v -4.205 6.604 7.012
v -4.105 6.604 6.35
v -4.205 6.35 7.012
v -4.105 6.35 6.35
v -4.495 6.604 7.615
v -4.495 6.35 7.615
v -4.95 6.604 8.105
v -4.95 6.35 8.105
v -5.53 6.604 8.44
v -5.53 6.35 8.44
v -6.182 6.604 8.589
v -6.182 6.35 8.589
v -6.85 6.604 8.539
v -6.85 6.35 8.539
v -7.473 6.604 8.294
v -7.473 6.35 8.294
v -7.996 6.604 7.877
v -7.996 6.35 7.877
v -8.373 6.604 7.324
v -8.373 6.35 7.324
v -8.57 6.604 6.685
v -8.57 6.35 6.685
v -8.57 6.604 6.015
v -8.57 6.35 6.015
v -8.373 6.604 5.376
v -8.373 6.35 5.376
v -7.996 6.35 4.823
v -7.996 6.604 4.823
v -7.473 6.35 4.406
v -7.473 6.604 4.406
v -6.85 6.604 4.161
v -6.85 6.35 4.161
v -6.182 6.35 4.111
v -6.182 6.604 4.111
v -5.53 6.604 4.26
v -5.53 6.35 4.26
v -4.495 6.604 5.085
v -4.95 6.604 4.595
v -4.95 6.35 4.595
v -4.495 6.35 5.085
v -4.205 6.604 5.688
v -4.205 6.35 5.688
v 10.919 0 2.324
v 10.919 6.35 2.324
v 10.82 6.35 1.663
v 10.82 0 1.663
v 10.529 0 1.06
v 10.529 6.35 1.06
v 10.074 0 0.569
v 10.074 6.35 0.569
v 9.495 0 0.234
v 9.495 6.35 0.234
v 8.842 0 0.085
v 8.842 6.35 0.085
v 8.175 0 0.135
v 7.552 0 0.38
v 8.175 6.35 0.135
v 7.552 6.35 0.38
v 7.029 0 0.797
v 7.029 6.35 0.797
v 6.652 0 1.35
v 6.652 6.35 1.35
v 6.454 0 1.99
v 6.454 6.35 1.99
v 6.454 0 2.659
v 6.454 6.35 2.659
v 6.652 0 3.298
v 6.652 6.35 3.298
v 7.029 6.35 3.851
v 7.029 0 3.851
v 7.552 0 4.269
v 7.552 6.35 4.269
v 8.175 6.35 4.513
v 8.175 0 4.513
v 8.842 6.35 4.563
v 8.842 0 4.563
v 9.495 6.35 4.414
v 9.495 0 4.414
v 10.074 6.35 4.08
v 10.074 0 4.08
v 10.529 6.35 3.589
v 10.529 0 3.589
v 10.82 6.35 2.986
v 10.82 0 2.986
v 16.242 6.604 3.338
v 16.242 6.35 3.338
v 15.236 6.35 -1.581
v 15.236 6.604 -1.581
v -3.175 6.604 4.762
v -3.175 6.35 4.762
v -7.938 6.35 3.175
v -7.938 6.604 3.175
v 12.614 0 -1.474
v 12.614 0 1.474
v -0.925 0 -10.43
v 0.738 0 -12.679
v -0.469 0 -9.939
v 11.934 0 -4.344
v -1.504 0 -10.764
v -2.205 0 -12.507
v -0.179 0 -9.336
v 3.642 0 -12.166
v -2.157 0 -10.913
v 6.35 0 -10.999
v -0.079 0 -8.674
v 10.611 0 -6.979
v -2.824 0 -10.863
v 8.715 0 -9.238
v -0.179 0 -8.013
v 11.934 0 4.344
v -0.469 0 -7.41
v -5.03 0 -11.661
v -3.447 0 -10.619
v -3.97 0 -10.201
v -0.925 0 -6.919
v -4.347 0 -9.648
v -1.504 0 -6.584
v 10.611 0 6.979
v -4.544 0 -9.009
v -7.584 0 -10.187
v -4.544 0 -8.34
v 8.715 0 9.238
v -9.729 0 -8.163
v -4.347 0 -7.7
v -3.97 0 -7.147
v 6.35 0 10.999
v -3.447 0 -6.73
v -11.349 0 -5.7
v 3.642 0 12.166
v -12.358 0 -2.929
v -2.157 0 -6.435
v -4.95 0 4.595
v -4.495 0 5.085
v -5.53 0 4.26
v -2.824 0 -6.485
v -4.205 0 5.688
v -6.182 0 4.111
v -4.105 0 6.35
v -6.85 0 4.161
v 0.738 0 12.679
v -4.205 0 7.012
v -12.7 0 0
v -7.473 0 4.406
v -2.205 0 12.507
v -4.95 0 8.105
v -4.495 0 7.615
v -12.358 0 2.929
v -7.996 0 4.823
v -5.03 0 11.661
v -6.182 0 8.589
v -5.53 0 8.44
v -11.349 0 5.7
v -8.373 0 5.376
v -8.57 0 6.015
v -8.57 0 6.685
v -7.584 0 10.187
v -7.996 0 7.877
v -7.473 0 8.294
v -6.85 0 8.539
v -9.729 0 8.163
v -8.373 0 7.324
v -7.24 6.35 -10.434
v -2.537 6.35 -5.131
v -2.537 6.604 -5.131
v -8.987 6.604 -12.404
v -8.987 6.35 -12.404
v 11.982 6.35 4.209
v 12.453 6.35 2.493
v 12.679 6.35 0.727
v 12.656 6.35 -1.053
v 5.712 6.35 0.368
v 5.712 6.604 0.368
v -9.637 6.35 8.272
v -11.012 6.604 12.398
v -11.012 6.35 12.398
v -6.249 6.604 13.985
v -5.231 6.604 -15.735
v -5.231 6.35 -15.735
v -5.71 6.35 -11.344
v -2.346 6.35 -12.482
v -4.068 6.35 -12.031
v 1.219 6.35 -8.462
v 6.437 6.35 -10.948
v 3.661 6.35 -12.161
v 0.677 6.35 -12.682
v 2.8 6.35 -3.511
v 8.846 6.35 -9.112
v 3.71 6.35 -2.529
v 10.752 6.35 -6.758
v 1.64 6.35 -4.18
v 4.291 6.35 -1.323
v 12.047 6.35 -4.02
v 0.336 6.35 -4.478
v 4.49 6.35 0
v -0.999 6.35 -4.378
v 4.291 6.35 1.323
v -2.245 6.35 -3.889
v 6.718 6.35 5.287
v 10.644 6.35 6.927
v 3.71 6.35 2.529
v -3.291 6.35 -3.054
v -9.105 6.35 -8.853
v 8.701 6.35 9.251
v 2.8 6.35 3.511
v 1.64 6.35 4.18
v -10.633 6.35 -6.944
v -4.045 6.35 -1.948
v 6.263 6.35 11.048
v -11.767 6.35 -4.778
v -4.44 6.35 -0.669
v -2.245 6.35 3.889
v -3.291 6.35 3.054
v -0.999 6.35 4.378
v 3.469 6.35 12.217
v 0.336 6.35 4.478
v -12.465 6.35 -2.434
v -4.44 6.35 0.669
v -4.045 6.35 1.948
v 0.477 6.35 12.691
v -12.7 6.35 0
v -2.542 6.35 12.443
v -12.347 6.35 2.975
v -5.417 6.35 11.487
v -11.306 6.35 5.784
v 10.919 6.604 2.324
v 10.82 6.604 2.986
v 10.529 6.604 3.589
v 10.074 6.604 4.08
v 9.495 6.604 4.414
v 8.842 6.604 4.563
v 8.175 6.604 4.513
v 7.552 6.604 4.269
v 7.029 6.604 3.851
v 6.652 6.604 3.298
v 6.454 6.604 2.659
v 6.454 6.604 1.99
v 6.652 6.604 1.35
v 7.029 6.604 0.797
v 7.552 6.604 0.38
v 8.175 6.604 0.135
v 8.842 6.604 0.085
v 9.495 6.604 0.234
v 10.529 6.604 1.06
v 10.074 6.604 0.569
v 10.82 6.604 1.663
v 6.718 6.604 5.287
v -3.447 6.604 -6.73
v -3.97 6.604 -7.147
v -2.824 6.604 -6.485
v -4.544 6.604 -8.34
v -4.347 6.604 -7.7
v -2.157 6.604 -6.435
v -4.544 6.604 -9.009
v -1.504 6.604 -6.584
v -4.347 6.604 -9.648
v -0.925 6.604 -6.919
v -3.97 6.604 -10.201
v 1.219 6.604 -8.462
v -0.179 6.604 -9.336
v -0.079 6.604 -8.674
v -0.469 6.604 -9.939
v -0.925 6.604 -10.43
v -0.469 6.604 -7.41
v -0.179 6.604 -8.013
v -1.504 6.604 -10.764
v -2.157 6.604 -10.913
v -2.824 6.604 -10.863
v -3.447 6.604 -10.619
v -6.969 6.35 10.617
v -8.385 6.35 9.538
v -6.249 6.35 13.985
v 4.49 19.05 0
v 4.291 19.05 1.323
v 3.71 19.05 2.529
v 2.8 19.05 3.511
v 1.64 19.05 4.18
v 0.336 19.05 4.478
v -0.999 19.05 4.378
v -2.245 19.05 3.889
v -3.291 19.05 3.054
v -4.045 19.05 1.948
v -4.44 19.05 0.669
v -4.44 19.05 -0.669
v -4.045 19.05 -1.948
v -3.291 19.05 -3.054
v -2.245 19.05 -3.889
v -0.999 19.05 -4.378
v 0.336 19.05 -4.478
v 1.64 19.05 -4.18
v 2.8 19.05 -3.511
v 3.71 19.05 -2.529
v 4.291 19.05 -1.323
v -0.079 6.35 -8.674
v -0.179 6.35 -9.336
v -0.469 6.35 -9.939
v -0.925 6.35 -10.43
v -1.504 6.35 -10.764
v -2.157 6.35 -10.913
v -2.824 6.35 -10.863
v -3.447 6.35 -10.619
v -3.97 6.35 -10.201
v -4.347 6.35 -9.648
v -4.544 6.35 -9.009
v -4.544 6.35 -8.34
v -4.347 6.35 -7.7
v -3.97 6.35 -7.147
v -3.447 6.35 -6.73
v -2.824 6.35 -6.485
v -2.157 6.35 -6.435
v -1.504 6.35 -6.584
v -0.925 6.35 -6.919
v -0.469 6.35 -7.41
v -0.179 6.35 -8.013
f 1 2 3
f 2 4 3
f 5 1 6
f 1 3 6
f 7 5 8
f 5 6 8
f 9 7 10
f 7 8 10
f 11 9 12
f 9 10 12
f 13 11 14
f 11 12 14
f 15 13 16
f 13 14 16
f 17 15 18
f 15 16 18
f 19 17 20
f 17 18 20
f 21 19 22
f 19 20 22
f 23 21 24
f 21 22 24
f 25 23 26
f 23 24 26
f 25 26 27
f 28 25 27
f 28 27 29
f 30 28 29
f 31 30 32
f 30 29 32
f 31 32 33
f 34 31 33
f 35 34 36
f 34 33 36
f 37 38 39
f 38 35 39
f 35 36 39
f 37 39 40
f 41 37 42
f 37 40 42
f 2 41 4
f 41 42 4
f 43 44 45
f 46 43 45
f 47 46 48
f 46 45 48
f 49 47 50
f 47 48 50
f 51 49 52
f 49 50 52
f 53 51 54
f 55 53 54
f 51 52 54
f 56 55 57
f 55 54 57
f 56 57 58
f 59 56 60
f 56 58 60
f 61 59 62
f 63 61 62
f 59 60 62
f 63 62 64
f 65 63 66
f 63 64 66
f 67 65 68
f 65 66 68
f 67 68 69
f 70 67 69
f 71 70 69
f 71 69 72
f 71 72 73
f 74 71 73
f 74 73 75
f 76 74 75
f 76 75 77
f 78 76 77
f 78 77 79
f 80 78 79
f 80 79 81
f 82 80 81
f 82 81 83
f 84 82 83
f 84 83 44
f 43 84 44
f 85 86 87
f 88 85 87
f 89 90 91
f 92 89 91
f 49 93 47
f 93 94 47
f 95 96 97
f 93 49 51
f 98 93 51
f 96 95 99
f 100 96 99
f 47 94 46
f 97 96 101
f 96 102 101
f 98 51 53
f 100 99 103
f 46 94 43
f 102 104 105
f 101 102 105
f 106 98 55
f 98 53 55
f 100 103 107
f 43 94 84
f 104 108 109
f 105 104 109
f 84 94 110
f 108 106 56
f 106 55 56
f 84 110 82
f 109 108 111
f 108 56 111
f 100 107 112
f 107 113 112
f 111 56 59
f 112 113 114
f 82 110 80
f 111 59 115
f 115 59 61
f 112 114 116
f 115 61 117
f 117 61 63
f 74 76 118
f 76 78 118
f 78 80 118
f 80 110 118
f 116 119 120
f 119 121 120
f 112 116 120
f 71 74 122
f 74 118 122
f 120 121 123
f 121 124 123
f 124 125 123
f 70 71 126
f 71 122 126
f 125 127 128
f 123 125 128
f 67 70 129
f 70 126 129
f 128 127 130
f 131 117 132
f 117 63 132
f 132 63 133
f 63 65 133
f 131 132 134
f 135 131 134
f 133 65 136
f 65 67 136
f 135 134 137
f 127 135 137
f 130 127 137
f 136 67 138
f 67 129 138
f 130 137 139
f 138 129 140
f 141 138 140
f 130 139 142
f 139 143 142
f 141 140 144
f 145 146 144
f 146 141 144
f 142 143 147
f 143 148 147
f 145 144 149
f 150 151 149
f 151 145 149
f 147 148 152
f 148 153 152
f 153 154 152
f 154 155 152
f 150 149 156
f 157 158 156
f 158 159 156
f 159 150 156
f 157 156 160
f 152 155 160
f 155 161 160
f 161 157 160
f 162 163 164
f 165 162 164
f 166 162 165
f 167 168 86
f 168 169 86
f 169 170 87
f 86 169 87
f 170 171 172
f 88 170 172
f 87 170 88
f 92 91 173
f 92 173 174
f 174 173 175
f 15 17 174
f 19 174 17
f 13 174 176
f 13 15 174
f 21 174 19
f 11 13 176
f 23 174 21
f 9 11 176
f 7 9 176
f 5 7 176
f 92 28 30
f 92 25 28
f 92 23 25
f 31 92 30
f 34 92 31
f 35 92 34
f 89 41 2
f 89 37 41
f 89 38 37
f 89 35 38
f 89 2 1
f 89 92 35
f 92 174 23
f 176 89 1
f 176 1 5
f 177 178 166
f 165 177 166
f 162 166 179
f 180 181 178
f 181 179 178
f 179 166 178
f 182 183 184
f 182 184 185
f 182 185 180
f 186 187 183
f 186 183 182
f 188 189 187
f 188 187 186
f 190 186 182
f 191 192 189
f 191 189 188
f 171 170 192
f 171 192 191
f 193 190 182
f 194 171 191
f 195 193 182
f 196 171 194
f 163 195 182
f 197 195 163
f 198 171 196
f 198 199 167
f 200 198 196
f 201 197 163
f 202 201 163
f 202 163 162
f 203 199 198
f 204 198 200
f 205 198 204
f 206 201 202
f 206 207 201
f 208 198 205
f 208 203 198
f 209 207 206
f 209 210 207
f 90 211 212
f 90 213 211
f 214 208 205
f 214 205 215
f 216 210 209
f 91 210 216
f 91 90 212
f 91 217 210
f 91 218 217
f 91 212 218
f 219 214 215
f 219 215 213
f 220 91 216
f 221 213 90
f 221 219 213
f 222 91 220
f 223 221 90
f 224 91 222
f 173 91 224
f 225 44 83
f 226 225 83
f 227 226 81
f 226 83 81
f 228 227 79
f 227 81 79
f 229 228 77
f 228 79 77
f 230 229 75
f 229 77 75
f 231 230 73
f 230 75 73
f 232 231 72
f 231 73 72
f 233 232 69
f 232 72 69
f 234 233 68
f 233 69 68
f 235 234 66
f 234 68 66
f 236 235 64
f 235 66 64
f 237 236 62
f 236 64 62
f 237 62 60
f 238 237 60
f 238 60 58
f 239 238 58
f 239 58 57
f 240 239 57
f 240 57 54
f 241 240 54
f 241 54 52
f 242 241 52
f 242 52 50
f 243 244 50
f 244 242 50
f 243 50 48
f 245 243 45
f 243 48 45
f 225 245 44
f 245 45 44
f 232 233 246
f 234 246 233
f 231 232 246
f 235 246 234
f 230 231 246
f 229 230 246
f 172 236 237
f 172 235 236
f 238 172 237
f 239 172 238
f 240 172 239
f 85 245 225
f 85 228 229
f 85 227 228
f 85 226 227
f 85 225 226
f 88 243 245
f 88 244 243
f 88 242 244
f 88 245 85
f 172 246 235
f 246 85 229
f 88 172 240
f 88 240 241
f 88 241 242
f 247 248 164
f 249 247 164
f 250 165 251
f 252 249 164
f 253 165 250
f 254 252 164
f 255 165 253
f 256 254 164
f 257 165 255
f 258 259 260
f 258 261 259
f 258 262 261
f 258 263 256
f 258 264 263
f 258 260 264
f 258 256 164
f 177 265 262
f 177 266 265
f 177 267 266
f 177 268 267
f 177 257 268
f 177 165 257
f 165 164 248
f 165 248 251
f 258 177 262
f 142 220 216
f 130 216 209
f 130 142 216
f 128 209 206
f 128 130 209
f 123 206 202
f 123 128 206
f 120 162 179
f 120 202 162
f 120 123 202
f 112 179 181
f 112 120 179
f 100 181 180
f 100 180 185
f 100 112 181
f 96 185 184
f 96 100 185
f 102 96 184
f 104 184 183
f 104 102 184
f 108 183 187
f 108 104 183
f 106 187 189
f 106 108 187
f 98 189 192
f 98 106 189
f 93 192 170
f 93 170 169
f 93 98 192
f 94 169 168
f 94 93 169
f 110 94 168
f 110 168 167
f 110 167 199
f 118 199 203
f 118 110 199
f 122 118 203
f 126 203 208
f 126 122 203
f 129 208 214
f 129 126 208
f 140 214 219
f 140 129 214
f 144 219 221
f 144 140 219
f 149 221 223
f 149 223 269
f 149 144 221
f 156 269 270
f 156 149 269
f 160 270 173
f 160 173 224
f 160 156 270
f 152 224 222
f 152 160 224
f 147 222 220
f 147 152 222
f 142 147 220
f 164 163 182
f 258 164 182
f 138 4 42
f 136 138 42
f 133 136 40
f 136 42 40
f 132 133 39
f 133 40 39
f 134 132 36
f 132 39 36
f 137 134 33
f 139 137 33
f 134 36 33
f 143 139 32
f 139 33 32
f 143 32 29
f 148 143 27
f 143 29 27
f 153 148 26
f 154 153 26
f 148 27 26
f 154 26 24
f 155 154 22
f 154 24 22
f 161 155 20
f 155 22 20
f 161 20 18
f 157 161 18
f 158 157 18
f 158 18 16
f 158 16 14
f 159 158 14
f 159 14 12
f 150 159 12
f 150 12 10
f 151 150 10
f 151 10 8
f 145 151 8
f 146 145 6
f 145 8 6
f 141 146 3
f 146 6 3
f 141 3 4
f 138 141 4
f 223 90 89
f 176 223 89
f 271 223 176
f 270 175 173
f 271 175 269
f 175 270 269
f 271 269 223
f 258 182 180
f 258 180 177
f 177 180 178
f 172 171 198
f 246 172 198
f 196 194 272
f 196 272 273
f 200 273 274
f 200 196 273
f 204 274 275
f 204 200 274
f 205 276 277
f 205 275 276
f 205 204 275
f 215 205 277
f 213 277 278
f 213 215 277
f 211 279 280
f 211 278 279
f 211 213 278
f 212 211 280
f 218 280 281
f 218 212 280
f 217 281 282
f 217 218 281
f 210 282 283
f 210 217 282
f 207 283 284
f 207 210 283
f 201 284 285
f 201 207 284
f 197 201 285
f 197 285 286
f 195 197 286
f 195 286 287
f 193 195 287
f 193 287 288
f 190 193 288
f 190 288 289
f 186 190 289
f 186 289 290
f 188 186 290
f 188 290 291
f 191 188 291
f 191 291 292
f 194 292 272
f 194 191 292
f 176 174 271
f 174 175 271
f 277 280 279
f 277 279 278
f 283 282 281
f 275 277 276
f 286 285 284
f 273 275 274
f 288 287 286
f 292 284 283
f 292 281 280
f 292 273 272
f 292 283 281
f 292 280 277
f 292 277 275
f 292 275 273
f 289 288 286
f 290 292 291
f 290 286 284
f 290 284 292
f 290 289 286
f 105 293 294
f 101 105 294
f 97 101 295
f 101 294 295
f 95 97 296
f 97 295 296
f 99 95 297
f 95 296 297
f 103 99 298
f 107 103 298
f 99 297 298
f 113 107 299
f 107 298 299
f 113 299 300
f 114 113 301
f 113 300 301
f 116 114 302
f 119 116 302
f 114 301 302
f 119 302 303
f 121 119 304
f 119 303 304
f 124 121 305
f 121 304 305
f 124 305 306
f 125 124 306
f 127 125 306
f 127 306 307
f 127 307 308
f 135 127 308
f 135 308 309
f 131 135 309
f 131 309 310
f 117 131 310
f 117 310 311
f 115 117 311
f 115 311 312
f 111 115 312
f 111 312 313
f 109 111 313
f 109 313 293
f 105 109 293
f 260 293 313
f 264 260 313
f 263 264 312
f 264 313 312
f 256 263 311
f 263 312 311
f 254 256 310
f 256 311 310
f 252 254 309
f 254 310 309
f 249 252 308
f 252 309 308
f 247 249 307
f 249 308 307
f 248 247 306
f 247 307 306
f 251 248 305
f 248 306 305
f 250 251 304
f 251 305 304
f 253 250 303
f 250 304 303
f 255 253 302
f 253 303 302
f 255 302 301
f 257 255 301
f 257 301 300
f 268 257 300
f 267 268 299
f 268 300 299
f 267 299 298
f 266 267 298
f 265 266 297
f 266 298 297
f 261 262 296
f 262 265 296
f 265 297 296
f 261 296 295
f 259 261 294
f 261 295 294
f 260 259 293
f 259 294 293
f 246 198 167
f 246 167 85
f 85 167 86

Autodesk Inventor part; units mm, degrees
ref_plane "YZ Plane" through (0, 0, 0) normal (1, 0, 0) x (0, 1, 0)
ref_plane "XZ Plane" through (0, 0, 0) normal (0, 1, 0) x (-1, 0, 0)
ref_plane "XY Plane" through (0, 0, 0) normal (0, 0, 1) x (1, 0, 0)
sketch "Sketch1" plane through (0, 0, 0) normal (0, 1, 0) x (-1, 0, 0)
  circle A0 centre (0, 0) radius 12.7
  dimension "d0" = 25.4
extrude "Extrusion1" add sketch "Sketch1" along normal blind 6.35
sketch "Sketch2" plane through (0, 6.35, 0) normal (0, 1, 0) x (1, 0, 0)
  line L0 (0, 0) -> (-6.35, 0)
  circle A0 centre (-6.35, -6.35) radius 2.2451
  line L1 (-3.175, -4.7625) -> (-7.9375, -3.175)
  line L2 (-7.9375, -3.175) -> (-11.0117, -12.3975)
  line L3 (-3.175, -4.7625) -> (-6.2492, -13.985)
  line L4 (-11.0117, -12.3975) -> (-6.2492, -13.985)
  circle A1 centre (8.6743, -2.3243) radius 2.2451
  line L5 (6.7184, -5.2866) -> (16.2423, -3.3376)
  line L6 (16.2423, -3.3376) -> (15.2359, 1.5806)
  line L7 (5.7119, -0.3684) -> (15.2359, 1.5806)
  line L8 (5.7119, -0.3684) -> (6.7184, -5.2866)
  circle A2 centre (-2.3243, 8.6743) radius 2.2451
  line L9 (1.2191, 8.4616) -> (-5.2307, 15.7351)
  line L10 (-5.2307, 15.7351) -> (-8.9867, 12.4044)
  line L11 (-2.5369, 5.1309) -> (-8.9867, 12.4044)
  line L12 (-2.5369, 5.1309) -> (1.2191, 8.4616)
  dimension "d5" = 360
extrude "Extrusion2" add sketch "Sketch2" along normal blind 0.254
sketch "Sketch3" plane through (-6.35, 6.35, 6.35) normal (0, 1, 0) x (1, 0, 0)
  point P0 (6.35, 6.35)
sketch "Sketch4" plane through (0, 6.35, 0) normal (0, 1, 0) x (1, 0, 0)
  circle A0 centre (-6.35, -6.35) radius 2.2451
  circle A1 centre (8.6743, -2.3243) radius 2.2451
  circle A2 centre (-2.3243, 8.6743) radius 2.2451
  point P0 (0, 0)
  dimension "d11" = 360
extrude "Extrusion3" cut sketch "Sketch4" against normal blind 12.7
sketch "Sketch5" plane through (0, 6.35, 0) normal (0, 1, 0) x (1, 0, 0)
  circle A0 centre (0, 0) radius 4.4901
extrude "Extrusion4" add sketch "Sketch5" along normal blind 12.7
properties part number "hand_shaft"
